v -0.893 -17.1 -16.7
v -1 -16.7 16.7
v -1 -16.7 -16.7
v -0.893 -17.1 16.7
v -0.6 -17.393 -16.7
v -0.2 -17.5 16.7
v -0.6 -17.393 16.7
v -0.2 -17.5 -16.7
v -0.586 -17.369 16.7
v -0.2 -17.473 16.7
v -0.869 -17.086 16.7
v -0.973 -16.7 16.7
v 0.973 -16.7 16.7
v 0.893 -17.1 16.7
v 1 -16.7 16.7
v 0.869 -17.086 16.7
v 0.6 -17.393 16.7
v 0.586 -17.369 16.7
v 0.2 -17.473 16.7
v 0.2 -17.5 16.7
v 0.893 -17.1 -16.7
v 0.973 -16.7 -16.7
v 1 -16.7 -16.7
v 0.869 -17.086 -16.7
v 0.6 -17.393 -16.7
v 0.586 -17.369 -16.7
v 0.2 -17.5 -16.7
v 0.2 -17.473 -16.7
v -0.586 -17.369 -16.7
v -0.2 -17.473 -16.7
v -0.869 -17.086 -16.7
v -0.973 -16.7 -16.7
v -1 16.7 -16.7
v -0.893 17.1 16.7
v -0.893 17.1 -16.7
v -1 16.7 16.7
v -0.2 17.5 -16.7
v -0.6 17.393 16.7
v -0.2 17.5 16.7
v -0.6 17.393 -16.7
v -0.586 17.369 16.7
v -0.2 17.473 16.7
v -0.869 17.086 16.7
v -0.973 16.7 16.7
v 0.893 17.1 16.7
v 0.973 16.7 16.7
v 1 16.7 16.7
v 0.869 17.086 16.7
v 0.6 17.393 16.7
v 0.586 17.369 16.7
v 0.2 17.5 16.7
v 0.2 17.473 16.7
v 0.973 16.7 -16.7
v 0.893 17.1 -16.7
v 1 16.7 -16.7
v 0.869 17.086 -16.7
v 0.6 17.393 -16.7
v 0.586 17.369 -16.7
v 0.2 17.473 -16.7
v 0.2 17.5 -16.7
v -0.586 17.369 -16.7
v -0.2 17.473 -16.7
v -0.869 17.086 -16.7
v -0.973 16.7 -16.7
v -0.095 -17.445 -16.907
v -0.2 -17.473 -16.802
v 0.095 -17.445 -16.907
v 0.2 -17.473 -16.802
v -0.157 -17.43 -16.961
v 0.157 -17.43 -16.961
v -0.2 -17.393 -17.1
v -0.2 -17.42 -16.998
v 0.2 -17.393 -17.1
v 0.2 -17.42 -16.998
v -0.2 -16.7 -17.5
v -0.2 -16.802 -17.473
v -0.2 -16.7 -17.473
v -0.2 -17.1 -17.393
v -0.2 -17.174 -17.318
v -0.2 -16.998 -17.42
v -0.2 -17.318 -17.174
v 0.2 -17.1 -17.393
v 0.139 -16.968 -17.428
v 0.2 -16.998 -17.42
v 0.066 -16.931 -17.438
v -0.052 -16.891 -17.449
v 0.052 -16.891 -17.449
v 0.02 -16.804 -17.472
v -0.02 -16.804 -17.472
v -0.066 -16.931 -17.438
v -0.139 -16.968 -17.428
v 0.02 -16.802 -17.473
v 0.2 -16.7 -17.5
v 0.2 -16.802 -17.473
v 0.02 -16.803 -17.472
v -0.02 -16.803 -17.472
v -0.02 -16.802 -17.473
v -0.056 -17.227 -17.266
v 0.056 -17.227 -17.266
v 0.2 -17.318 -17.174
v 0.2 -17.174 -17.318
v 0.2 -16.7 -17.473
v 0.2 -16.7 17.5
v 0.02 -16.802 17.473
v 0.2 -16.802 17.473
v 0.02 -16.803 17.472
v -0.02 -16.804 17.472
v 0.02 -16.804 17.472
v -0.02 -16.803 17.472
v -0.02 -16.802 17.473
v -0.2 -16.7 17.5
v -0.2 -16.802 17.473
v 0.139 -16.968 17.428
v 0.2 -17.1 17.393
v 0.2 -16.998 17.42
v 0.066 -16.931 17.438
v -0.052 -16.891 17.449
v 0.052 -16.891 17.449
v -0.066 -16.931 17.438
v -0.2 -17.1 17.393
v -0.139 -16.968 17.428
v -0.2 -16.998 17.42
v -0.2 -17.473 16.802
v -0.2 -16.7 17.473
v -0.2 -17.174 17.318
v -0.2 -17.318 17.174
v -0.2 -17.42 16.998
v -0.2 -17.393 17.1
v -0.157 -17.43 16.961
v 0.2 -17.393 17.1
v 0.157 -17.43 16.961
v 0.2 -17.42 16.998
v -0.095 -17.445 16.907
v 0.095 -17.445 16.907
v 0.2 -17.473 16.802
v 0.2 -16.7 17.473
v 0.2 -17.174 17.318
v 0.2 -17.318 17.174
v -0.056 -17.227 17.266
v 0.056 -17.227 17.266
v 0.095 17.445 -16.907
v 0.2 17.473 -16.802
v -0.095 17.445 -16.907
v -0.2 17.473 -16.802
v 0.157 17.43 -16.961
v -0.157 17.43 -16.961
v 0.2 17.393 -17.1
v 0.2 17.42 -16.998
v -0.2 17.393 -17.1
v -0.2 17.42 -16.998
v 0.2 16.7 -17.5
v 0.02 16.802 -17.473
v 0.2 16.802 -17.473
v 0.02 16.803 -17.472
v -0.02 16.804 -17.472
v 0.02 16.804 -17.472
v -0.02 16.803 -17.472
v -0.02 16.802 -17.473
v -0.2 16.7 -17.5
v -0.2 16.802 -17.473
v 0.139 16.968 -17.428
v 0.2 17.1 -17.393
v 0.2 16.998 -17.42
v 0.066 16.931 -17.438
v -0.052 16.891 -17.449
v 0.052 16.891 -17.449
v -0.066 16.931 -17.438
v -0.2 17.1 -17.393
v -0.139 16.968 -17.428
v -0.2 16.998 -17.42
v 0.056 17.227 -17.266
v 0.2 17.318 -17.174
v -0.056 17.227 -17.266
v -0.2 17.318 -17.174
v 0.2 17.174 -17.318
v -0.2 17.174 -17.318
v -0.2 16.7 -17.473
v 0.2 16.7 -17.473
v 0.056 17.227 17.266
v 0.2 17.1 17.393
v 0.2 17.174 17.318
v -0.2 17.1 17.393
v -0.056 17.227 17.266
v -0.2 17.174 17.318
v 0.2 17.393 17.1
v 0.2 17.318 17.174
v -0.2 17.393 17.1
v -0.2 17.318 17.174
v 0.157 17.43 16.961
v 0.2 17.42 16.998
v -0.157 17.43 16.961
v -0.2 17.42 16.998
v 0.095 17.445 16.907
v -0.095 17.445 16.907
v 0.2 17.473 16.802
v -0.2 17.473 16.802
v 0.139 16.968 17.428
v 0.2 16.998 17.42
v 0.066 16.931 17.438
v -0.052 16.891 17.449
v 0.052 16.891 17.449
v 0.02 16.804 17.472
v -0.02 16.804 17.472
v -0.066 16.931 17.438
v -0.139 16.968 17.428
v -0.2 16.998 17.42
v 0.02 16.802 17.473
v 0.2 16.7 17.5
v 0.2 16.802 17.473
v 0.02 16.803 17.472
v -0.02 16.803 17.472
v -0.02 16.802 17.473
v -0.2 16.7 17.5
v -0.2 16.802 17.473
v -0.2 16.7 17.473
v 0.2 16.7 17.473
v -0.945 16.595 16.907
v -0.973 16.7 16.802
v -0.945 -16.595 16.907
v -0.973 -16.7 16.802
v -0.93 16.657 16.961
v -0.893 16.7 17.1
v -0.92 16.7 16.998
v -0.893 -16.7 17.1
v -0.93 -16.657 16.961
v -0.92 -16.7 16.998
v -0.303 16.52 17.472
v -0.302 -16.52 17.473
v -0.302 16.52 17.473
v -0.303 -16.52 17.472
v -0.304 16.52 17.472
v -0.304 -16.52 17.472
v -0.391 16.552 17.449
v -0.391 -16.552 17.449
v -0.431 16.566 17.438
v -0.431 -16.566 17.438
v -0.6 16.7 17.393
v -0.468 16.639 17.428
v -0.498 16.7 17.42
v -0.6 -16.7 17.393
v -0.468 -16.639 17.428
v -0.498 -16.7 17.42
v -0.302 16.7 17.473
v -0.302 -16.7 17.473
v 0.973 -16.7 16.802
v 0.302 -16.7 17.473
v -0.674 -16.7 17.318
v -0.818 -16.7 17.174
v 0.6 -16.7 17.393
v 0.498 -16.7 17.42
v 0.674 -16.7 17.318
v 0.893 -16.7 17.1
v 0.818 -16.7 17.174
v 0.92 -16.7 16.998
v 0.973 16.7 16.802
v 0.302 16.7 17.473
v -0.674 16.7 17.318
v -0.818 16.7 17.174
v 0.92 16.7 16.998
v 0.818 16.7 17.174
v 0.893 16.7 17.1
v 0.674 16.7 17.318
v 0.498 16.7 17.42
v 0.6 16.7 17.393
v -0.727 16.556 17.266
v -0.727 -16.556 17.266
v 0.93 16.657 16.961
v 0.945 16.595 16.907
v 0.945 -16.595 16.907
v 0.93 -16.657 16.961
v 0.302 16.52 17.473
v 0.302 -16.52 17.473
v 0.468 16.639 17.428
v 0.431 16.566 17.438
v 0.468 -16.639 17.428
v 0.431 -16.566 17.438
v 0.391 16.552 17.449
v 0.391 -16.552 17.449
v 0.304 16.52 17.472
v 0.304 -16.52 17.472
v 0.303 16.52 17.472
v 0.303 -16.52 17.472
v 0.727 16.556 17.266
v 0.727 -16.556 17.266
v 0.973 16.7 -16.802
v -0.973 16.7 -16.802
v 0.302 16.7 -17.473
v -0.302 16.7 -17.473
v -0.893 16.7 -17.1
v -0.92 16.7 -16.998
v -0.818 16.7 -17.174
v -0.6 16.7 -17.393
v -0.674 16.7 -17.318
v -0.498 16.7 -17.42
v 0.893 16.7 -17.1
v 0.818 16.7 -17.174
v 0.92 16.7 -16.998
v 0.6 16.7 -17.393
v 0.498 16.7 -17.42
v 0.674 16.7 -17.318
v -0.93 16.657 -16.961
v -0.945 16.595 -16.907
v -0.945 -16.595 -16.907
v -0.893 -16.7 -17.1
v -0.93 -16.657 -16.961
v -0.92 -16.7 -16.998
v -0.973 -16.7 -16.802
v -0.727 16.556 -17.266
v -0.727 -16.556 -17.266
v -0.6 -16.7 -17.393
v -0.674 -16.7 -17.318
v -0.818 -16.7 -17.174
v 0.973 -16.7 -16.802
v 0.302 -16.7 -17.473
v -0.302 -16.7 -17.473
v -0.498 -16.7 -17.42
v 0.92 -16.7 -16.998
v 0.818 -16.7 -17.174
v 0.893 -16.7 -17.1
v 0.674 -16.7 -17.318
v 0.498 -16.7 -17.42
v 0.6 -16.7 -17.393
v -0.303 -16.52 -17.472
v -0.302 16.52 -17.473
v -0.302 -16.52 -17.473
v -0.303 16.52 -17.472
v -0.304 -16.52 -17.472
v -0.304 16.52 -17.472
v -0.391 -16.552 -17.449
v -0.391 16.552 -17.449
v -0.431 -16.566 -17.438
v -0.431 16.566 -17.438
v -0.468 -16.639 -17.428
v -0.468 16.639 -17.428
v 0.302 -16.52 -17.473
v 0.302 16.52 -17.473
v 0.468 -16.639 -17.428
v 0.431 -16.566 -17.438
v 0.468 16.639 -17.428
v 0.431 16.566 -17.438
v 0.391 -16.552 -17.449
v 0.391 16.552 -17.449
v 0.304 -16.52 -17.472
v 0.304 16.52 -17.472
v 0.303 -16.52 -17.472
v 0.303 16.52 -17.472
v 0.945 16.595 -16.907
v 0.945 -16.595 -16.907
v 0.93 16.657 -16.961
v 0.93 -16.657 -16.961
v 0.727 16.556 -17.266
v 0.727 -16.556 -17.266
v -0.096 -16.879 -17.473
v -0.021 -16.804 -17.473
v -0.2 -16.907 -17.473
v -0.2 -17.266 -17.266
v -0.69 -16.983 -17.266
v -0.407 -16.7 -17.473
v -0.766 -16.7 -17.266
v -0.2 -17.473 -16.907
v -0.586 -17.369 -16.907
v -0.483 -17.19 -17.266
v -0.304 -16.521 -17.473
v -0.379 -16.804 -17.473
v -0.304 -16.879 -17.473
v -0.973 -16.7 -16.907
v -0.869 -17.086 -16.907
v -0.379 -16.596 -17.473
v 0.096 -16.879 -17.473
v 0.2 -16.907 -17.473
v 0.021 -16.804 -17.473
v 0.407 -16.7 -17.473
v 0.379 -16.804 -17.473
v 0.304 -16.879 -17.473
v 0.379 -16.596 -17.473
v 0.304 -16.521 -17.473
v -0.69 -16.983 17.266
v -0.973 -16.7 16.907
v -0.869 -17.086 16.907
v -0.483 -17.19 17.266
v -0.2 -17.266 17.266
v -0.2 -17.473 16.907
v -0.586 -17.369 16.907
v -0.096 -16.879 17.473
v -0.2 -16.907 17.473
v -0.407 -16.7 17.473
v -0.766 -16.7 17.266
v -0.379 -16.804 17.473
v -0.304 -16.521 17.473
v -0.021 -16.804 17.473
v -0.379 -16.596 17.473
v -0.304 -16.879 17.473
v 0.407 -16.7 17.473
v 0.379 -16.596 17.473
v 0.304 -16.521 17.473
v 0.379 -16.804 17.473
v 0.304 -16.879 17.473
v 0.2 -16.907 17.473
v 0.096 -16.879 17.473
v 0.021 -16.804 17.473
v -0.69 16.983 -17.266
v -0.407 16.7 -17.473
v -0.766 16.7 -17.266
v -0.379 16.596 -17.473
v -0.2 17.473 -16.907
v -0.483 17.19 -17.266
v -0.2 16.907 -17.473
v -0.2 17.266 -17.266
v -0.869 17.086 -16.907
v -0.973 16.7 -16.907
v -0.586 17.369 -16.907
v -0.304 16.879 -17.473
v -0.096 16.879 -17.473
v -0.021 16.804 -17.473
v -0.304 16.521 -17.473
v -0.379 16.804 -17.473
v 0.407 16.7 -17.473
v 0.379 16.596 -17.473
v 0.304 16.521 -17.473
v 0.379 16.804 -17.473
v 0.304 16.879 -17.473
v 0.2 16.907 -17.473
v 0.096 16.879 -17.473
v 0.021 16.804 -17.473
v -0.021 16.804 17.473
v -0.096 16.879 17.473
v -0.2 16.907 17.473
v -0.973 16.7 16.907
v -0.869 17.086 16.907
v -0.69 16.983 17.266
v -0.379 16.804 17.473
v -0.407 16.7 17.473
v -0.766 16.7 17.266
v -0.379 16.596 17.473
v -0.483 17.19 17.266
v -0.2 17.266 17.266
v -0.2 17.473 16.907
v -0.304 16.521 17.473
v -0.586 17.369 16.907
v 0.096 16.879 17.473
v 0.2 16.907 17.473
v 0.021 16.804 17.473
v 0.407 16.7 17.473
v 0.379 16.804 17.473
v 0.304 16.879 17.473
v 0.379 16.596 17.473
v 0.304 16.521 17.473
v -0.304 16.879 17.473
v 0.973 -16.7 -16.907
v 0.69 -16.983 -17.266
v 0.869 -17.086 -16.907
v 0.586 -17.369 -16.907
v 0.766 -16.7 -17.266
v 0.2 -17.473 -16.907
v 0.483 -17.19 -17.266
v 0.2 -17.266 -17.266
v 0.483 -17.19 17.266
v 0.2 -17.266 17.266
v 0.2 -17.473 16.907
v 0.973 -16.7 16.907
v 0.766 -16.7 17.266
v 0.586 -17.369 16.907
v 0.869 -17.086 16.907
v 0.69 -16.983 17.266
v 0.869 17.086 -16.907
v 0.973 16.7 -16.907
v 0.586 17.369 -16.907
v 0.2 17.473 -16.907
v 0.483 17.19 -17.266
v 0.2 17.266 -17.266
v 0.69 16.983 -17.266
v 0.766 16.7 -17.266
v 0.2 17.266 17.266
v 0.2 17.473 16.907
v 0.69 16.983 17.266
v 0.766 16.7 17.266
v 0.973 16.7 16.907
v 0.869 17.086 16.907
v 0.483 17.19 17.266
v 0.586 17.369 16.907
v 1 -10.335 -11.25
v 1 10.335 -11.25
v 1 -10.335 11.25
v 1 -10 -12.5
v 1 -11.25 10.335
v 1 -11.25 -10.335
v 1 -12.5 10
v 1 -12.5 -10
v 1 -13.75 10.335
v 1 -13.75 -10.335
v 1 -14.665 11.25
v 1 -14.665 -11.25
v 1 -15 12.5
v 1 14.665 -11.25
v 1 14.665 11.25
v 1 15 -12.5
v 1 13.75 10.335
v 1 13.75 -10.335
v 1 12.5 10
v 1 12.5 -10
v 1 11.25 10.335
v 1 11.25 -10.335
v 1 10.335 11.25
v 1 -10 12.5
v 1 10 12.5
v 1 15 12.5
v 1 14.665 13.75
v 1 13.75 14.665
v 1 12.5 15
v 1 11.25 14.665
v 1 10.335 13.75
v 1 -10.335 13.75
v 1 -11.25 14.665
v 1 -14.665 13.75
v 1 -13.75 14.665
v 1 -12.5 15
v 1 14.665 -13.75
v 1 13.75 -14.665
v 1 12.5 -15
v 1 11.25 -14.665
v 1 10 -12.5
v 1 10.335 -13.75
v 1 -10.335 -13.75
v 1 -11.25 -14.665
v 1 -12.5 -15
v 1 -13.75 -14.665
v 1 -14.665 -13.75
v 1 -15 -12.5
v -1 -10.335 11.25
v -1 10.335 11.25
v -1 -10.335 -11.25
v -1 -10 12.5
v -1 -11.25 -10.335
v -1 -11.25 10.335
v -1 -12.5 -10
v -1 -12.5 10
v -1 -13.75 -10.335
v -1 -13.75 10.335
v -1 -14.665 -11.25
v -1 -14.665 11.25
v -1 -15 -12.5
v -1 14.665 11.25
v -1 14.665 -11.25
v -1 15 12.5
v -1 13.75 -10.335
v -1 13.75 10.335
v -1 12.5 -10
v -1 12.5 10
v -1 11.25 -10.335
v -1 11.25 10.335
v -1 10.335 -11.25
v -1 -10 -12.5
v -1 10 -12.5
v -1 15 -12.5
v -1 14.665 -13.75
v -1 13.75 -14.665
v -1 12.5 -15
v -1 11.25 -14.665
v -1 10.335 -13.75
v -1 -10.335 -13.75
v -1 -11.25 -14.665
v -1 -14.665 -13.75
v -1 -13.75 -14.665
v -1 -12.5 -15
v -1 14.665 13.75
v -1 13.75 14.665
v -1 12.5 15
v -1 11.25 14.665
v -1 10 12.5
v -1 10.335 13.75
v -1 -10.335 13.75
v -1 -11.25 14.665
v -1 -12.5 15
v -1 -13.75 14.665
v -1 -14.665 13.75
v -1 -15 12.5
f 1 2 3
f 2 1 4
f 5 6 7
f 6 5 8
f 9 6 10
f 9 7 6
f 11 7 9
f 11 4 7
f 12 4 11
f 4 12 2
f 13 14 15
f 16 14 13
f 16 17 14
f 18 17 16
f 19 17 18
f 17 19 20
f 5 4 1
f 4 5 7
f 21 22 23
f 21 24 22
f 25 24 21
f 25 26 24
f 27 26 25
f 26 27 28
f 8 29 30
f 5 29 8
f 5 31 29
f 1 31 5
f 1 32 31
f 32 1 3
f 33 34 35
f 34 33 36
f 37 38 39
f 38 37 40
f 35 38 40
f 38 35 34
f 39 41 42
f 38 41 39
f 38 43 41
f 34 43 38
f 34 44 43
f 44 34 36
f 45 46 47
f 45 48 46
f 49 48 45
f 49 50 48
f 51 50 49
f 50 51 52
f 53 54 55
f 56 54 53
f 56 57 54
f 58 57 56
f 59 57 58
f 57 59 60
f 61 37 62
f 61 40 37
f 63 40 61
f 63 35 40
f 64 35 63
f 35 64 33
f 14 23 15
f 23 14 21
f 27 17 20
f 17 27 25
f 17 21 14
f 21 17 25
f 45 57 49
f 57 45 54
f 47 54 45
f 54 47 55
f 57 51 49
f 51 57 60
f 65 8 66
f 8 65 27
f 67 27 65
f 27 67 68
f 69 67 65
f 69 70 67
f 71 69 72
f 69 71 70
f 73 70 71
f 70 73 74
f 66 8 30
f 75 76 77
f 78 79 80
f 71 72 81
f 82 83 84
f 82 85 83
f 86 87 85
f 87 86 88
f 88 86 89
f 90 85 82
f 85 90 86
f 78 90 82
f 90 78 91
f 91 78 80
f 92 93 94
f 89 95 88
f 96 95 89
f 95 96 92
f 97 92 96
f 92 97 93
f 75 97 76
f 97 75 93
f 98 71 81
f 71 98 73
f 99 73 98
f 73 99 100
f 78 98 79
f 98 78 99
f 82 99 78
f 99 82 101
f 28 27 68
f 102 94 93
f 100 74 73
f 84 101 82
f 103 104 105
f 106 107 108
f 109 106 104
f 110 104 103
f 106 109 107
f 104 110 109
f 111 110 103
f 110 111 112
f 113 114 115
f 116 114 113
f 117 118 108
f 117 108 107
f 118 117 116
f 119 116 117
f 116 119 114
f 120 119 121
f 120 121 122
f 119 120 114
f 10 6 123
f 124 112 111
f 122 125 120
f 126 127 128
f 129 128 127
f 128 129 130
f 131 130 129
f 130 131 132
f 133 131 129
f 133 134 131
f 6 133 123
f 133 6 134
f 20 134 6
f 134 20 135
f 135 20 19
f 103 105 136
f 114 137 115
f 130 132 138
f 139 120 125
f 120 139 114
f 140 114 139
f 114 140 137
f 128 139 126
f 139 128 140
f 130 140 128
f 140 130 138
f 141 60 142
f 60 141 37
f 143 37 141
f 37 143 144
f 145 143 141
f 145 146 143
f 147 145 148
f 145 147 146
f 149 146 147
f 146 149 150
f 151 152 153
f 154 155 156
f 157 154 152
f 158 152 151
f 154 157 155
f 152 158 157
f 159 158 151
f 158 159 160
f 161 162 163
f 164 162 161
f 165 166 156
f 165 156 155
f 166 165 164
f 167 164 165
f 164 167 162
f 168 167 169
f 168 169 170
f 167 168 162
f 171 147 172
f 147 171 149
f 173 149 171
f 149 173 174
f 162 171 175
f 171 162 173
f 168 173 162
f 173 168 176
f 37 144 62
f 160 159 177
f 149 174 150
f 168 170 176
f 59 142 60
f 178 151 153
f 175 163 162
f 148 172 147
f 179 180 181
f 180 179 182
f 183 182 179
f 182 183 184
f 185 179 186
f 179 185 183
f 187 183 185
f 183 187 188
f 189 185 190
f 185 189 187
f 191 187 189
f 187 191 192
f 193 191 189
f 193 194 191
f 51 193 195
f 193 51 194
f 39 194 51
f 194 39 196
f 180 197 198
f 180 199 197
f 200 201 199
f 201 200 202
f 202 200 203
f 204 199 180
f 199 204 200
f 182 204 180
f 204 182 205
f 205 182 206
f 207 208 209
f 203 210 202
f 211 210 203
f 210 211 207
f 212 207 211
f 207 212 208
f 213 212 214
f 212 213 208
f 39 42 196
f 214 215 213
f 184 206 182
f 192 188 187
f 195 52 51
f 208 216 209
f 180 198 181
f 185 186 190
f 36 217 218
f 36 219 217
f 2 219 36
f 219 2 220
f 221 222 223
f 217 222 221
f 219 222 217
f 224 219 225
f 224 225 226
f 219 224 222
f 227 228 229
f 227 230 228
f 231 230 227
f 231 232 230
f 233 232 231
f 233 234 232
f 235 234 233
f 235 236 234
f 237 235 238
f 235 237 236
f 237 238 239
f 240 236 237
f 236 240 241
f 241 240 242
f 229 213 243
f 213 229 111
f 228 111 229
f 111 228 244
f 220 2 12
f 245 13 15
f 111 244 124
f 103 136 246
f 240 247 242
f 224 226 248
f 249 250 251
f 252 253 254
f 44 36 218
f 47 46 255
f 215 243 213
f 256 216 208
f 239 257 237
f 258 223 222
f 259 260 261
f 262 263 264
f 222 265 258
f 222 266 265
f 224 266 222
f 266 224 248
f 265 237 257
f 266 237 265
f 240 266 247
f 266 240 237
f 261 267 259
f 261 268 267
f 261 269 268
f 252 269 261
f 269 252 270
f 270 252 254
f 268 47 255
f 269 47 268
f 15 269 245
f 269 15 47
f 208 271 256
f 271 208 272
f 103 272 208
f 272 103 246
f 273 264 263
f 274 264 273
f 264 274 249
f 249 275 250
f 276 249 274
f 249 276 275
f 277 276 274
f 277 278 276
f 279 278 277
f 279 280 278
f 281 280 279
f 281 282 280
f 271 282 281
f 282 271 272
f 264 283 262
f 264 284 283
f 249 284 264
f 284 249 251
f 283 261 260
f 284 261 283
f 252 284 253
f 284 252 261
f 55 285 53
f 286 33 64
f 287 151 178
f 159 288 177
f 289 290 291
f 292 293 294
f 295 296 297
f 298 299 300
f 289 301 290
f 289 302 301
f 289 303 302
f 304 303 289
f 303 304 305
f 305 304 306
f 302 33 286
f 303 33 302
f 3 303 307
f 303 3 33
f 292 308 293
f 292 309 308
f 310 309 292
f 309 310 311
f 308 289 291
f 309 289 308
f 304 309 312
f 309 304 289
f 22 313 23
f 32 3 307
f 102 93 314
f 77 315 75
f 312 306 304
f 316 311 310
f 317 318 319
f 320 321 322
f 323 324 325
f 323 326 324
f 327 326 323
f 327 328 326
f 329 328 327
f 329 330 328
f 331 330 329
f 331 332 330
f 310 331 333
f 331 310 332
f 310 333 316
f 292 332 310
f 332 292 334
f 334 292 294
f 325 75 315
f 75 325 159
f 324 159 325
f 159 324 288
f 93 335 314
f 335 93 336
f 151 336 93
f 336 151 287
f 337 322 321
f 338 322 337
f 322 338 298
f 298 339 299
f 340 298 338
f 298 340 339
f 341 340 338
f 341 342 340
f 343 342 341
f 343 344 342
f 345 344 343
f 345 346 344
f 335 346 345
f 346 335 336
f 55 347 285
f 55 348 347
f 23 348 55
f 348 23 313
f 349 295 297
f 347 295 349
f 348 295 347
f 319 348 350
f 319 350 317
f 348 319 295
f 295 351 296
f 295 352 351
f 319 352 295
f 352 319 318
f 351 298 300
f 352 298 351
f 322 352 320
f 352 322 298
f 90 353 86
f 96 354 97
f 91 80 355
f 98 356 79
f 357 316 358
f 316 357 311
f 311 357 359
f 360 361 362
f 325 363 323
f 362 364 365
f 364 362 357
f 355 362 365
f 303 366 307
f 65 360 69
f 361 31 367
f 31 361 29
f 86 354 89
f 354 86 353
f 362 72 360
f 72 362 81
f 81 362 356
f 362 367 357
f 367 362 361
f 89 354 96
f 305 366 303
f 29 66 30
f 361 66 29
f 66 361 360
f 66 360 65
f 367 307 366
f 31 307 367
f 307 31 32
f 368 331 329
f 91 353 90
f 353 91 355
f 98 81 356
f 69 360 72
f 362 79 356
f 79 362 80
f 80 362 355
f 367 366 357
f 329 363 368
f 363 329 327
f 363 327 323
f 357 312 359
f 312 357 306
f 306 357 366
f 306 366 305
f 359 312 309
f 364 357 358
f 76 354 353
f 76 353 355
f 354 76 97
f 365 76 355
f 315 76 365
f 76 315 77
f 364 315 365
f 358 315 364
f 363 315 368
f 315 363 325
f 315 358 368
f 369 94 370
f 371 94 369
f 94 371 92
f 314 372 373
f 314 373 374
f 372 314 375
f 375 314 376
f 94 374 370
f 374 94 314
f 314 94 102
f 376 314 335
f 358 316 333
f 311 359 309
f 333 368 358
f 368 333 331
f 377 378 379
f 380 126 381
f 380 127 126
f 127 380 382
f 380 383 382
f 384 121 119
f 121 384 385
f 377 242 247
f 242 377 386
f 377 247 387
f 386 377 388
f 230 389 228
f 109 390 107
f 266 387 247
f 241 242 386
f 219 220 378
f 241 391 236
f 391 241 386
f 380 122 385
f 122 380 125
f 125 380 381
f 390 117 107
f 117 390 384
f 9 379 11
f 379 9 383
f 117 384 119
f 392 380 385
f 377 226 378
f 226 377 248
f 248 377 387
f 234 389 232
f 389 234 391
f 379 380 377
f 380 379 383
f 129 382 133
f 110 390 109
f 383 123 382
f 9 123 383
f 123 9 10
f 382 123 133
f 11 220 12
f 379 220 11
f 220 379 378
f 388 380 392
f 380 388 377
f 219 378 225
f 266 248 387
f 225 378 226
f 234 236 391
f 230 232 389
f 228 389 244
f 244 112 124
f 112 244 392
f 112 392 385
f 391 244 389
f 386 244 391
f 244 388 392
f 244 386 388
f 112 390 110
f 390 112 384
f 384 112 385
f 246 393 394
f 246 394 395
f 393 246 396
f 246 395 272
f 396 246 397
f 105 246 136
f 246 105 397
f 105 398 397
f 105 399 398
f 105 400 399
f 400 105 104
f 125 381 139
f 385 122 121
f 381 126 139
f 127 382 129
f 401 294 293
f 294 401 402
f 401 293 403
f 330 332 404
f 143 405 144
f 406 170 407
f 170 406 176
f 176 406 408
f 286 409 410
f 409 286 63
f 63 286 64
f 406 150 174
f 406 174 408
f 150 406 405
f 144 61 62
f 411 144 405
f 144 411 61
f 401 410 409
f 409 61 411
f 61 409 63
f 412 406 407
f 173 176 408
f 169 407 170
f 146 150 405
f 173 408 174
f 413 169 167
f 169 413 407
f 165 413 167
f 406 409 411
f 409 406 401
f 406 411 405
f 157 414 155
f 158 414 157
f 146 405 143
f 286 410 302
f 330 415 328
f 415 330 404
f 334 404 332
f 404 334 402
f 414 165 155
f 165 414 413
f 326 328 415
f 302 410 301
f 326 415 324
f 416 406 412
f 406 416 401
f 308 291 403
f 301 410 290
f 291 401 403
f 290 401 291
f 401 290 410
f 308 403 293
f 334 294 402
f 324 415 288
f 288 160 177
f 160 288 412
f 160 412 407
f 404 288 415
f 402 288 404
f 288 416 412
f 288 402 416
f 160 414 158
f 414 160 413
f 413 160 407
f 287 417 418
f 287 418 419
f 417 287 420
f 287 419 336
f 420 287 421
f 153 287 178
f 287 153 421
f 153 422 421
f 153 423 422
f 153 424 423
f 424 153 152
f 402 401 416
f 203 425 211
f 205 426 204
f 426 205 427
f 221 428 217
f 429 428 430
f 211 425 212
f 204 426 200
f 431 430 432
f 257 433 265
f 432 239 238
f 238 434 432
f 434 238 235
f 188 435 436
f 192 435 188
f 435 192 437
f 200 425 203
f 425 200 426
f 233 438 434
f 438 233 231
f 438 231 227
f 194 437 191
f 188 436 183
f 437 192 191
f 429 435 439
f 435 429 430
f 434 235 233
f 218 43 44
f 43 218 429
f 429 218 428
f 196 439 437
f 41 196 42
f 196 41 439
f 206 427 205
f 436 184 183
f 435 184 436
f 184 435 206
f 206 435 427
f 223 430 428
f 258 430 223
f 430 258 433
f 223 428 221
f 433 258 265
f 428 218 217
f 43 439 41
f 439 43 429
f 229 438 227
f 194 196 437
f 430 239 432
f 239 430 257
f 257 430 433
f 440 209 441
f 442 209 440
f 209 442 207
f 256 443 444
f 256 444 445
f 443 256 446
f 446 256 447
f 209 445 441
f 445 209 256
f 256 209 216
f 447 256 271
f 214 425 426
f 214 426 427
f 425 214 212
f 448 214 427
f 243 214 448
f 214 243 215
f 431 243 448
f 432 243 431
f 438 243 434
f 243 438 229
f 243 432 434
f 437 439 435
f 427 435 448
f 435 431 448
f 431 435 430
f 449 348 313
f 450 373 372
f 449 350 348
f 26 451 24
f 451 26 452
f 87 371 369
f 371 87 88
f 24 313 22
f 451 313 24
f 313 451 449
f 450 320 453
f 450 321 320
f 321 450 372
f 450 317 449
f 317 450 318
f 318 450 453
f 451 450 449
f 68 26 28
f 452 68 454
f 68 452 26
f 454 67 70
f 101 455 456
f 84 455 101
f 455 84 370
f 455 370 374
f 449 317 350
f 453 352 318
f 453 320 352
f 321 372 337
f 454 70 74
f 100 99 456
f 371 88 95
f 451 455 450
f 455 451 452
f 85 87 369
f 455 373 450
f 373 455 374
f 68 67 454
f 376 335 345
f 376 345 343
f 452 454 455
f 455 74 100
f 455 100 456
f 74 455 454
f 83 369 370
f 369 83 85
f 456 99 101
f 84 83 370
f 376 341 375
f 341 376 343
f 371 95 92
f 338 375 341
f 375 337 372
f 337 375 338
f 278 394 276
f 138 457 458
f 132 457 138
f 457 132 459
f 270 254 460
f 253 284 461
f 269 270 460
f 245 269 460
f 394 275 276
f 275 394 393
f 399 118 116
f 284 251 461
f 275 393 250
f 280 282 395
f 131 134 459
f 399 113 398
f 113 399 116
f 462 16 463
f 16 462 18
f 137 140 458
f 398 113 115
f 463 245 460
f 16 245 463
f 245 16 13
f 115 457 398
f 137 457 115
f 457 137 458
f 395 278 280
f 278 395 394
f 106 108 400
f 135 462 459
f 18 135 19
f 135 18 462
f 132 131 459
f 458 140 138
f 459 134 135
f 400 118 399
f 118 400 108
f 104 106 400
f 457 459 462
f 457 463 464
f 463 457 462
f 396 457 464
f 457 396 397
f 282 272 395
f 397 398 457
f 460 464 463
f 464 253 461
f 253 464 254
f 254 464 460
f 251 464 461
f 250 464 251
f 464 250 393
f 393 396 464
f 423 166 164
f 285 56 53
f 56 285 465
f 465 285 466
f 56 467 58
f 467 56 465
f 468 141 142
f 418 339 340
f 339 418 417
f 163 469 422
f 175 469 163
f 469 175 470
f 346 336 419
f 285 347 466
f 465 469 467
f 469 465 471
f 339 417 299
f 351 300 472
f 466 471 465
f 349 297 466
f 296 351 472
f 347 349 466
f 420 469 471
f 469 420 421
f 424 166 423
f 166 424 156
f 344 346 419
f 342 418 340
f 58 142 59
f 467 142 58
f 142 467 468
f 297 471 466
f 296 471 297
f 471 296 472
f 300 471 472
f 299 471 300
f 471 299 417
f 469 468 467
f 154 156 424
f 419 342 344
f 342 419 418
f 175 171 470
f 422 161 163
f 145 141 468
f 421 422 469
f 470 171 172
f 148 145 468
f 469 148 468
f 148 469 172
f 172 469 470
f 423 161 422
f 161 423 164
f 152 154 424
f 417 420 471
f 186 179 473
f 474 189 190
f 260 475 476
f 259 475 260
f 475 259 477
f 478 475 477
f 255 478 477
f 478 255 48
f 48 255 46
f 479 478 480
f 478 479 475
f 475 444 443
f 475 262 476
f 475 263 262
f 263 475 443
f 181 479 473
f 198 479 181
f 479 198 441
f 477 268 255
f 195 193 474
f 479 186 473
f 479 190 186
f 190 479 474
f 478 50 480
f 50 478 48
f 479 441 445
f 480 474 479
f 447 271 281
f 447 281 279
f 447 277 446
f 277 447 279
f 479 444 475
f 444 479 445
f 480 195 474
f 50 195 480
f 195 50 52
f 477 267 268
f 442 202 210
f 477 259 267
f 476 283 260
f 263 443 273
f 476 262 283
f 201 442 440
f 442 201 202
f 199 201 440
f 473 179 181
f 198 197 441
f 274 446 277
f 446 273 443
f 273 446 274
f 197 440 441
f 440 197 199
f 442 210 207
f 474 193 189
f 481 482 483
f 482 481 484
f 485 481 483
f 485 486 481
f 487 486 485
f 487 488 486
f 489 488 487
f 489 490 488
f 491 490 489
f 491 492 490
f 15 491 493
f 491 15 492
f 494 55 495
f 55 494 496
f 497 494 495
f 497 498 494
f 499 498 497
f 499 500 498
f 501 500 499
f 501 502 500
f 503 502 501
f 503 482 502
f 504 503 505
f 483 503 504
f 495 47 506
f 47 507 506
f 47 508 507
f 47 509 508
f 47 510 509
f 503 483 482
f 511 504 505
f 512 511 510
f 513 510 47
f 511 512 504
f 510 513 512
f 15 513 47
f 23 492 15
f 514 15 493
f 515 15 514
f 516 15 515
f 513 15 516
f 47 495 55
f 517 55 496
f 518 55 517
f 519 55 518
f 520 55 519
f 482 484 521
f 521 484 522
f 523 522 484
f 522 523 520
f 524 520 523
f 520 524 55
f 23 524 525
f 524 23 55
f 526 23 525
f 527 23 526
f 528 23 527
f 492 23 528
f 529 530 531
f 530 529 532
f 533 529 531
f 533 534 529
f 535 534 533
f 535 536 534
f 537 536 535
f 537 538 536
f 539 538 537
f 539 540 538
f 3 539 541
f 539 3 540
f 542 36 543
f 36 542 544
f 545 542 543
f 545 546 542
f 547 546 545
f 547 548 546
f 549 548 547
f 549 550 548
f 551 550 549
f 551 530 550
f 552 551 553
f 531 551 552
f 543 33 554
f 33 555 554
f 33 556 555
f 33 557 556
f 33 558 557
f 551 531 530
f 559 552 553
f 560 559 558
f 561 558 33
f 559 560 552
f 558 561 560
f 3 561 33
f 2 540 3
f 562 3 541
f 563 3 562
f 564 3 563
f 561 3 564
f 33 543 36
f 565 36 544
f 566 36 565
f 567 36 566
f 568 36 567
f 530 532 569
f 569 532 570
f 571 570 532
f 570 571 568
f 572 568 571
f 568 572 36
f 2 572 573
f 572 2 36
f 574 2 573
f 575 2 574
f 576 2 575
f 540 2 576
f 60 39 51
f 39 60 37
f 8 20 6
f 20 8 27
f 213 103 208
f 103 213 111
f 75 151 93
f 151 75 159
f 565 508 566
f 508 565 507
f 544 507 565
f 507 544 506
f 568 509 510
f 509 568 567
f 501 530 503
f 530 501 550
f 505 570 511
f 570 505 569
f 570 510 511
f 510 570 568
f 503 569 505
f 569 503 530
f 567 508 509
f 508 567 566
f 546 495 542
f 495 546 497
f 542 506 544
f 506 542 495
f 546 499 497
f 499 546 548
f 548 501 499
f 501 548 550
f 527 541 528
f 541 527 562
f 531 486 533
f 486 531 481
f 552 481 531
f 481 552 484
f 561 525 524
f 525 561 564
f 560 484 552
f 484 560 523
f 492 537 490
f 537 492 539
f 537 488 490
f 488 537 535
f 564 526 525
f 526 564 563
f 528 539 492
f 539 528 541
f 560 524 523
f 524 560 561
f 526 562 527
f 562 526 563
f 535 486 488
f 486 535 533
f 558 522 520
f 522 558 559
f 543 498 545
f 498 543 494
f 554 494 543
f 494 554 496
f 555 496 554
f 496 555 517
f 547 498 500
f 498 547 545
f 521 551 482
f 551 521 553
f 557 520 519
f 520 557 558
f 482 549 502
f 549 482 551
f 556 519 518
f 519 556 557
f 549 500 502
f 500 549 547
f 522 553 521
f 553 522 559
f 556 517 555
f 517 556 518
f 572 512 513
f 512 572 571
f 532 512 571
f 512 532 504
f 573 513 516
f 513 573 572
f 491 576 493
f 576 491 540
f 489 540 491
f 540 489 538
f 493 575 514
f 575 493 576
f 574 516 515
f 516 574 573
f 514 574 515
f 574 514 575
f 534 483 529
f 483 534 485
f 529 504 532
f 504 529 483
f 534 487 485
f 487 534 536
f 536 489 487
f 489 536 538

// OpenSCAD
use <MCAD/boxes.scad>

$fn = 12;

module peg() {
    translate(v = [
        0,0,-2
    ]) 
    cylinder(h = 8, r = 2.5);
}
difference() {
color([0, 1, 0])
roundedBox(size = [
    2, 35, 35
], radius = 0.8, sidesonly = false);

translate(v = [
    0, 12.5, 12.5
])
rotate(a = [
    90, 0, 90
])
color([1, 0, 1])
peg();

translate(v = [
    0, -12.5, -12.5
])
rotate(a = [
    90, 0, 90
])
color([1, 1, 0])
peg();

translate(v = [
    0, 12.5, -12.5
])
rotate(a = [
    90, 0, 90
])
color([1, 0, 0])
peg();

translate(v = [
    0, -12.5, 12.5
])
rotate(a = [
    90, 0, 90
])
color([0, 0, 1])
peg();

}
